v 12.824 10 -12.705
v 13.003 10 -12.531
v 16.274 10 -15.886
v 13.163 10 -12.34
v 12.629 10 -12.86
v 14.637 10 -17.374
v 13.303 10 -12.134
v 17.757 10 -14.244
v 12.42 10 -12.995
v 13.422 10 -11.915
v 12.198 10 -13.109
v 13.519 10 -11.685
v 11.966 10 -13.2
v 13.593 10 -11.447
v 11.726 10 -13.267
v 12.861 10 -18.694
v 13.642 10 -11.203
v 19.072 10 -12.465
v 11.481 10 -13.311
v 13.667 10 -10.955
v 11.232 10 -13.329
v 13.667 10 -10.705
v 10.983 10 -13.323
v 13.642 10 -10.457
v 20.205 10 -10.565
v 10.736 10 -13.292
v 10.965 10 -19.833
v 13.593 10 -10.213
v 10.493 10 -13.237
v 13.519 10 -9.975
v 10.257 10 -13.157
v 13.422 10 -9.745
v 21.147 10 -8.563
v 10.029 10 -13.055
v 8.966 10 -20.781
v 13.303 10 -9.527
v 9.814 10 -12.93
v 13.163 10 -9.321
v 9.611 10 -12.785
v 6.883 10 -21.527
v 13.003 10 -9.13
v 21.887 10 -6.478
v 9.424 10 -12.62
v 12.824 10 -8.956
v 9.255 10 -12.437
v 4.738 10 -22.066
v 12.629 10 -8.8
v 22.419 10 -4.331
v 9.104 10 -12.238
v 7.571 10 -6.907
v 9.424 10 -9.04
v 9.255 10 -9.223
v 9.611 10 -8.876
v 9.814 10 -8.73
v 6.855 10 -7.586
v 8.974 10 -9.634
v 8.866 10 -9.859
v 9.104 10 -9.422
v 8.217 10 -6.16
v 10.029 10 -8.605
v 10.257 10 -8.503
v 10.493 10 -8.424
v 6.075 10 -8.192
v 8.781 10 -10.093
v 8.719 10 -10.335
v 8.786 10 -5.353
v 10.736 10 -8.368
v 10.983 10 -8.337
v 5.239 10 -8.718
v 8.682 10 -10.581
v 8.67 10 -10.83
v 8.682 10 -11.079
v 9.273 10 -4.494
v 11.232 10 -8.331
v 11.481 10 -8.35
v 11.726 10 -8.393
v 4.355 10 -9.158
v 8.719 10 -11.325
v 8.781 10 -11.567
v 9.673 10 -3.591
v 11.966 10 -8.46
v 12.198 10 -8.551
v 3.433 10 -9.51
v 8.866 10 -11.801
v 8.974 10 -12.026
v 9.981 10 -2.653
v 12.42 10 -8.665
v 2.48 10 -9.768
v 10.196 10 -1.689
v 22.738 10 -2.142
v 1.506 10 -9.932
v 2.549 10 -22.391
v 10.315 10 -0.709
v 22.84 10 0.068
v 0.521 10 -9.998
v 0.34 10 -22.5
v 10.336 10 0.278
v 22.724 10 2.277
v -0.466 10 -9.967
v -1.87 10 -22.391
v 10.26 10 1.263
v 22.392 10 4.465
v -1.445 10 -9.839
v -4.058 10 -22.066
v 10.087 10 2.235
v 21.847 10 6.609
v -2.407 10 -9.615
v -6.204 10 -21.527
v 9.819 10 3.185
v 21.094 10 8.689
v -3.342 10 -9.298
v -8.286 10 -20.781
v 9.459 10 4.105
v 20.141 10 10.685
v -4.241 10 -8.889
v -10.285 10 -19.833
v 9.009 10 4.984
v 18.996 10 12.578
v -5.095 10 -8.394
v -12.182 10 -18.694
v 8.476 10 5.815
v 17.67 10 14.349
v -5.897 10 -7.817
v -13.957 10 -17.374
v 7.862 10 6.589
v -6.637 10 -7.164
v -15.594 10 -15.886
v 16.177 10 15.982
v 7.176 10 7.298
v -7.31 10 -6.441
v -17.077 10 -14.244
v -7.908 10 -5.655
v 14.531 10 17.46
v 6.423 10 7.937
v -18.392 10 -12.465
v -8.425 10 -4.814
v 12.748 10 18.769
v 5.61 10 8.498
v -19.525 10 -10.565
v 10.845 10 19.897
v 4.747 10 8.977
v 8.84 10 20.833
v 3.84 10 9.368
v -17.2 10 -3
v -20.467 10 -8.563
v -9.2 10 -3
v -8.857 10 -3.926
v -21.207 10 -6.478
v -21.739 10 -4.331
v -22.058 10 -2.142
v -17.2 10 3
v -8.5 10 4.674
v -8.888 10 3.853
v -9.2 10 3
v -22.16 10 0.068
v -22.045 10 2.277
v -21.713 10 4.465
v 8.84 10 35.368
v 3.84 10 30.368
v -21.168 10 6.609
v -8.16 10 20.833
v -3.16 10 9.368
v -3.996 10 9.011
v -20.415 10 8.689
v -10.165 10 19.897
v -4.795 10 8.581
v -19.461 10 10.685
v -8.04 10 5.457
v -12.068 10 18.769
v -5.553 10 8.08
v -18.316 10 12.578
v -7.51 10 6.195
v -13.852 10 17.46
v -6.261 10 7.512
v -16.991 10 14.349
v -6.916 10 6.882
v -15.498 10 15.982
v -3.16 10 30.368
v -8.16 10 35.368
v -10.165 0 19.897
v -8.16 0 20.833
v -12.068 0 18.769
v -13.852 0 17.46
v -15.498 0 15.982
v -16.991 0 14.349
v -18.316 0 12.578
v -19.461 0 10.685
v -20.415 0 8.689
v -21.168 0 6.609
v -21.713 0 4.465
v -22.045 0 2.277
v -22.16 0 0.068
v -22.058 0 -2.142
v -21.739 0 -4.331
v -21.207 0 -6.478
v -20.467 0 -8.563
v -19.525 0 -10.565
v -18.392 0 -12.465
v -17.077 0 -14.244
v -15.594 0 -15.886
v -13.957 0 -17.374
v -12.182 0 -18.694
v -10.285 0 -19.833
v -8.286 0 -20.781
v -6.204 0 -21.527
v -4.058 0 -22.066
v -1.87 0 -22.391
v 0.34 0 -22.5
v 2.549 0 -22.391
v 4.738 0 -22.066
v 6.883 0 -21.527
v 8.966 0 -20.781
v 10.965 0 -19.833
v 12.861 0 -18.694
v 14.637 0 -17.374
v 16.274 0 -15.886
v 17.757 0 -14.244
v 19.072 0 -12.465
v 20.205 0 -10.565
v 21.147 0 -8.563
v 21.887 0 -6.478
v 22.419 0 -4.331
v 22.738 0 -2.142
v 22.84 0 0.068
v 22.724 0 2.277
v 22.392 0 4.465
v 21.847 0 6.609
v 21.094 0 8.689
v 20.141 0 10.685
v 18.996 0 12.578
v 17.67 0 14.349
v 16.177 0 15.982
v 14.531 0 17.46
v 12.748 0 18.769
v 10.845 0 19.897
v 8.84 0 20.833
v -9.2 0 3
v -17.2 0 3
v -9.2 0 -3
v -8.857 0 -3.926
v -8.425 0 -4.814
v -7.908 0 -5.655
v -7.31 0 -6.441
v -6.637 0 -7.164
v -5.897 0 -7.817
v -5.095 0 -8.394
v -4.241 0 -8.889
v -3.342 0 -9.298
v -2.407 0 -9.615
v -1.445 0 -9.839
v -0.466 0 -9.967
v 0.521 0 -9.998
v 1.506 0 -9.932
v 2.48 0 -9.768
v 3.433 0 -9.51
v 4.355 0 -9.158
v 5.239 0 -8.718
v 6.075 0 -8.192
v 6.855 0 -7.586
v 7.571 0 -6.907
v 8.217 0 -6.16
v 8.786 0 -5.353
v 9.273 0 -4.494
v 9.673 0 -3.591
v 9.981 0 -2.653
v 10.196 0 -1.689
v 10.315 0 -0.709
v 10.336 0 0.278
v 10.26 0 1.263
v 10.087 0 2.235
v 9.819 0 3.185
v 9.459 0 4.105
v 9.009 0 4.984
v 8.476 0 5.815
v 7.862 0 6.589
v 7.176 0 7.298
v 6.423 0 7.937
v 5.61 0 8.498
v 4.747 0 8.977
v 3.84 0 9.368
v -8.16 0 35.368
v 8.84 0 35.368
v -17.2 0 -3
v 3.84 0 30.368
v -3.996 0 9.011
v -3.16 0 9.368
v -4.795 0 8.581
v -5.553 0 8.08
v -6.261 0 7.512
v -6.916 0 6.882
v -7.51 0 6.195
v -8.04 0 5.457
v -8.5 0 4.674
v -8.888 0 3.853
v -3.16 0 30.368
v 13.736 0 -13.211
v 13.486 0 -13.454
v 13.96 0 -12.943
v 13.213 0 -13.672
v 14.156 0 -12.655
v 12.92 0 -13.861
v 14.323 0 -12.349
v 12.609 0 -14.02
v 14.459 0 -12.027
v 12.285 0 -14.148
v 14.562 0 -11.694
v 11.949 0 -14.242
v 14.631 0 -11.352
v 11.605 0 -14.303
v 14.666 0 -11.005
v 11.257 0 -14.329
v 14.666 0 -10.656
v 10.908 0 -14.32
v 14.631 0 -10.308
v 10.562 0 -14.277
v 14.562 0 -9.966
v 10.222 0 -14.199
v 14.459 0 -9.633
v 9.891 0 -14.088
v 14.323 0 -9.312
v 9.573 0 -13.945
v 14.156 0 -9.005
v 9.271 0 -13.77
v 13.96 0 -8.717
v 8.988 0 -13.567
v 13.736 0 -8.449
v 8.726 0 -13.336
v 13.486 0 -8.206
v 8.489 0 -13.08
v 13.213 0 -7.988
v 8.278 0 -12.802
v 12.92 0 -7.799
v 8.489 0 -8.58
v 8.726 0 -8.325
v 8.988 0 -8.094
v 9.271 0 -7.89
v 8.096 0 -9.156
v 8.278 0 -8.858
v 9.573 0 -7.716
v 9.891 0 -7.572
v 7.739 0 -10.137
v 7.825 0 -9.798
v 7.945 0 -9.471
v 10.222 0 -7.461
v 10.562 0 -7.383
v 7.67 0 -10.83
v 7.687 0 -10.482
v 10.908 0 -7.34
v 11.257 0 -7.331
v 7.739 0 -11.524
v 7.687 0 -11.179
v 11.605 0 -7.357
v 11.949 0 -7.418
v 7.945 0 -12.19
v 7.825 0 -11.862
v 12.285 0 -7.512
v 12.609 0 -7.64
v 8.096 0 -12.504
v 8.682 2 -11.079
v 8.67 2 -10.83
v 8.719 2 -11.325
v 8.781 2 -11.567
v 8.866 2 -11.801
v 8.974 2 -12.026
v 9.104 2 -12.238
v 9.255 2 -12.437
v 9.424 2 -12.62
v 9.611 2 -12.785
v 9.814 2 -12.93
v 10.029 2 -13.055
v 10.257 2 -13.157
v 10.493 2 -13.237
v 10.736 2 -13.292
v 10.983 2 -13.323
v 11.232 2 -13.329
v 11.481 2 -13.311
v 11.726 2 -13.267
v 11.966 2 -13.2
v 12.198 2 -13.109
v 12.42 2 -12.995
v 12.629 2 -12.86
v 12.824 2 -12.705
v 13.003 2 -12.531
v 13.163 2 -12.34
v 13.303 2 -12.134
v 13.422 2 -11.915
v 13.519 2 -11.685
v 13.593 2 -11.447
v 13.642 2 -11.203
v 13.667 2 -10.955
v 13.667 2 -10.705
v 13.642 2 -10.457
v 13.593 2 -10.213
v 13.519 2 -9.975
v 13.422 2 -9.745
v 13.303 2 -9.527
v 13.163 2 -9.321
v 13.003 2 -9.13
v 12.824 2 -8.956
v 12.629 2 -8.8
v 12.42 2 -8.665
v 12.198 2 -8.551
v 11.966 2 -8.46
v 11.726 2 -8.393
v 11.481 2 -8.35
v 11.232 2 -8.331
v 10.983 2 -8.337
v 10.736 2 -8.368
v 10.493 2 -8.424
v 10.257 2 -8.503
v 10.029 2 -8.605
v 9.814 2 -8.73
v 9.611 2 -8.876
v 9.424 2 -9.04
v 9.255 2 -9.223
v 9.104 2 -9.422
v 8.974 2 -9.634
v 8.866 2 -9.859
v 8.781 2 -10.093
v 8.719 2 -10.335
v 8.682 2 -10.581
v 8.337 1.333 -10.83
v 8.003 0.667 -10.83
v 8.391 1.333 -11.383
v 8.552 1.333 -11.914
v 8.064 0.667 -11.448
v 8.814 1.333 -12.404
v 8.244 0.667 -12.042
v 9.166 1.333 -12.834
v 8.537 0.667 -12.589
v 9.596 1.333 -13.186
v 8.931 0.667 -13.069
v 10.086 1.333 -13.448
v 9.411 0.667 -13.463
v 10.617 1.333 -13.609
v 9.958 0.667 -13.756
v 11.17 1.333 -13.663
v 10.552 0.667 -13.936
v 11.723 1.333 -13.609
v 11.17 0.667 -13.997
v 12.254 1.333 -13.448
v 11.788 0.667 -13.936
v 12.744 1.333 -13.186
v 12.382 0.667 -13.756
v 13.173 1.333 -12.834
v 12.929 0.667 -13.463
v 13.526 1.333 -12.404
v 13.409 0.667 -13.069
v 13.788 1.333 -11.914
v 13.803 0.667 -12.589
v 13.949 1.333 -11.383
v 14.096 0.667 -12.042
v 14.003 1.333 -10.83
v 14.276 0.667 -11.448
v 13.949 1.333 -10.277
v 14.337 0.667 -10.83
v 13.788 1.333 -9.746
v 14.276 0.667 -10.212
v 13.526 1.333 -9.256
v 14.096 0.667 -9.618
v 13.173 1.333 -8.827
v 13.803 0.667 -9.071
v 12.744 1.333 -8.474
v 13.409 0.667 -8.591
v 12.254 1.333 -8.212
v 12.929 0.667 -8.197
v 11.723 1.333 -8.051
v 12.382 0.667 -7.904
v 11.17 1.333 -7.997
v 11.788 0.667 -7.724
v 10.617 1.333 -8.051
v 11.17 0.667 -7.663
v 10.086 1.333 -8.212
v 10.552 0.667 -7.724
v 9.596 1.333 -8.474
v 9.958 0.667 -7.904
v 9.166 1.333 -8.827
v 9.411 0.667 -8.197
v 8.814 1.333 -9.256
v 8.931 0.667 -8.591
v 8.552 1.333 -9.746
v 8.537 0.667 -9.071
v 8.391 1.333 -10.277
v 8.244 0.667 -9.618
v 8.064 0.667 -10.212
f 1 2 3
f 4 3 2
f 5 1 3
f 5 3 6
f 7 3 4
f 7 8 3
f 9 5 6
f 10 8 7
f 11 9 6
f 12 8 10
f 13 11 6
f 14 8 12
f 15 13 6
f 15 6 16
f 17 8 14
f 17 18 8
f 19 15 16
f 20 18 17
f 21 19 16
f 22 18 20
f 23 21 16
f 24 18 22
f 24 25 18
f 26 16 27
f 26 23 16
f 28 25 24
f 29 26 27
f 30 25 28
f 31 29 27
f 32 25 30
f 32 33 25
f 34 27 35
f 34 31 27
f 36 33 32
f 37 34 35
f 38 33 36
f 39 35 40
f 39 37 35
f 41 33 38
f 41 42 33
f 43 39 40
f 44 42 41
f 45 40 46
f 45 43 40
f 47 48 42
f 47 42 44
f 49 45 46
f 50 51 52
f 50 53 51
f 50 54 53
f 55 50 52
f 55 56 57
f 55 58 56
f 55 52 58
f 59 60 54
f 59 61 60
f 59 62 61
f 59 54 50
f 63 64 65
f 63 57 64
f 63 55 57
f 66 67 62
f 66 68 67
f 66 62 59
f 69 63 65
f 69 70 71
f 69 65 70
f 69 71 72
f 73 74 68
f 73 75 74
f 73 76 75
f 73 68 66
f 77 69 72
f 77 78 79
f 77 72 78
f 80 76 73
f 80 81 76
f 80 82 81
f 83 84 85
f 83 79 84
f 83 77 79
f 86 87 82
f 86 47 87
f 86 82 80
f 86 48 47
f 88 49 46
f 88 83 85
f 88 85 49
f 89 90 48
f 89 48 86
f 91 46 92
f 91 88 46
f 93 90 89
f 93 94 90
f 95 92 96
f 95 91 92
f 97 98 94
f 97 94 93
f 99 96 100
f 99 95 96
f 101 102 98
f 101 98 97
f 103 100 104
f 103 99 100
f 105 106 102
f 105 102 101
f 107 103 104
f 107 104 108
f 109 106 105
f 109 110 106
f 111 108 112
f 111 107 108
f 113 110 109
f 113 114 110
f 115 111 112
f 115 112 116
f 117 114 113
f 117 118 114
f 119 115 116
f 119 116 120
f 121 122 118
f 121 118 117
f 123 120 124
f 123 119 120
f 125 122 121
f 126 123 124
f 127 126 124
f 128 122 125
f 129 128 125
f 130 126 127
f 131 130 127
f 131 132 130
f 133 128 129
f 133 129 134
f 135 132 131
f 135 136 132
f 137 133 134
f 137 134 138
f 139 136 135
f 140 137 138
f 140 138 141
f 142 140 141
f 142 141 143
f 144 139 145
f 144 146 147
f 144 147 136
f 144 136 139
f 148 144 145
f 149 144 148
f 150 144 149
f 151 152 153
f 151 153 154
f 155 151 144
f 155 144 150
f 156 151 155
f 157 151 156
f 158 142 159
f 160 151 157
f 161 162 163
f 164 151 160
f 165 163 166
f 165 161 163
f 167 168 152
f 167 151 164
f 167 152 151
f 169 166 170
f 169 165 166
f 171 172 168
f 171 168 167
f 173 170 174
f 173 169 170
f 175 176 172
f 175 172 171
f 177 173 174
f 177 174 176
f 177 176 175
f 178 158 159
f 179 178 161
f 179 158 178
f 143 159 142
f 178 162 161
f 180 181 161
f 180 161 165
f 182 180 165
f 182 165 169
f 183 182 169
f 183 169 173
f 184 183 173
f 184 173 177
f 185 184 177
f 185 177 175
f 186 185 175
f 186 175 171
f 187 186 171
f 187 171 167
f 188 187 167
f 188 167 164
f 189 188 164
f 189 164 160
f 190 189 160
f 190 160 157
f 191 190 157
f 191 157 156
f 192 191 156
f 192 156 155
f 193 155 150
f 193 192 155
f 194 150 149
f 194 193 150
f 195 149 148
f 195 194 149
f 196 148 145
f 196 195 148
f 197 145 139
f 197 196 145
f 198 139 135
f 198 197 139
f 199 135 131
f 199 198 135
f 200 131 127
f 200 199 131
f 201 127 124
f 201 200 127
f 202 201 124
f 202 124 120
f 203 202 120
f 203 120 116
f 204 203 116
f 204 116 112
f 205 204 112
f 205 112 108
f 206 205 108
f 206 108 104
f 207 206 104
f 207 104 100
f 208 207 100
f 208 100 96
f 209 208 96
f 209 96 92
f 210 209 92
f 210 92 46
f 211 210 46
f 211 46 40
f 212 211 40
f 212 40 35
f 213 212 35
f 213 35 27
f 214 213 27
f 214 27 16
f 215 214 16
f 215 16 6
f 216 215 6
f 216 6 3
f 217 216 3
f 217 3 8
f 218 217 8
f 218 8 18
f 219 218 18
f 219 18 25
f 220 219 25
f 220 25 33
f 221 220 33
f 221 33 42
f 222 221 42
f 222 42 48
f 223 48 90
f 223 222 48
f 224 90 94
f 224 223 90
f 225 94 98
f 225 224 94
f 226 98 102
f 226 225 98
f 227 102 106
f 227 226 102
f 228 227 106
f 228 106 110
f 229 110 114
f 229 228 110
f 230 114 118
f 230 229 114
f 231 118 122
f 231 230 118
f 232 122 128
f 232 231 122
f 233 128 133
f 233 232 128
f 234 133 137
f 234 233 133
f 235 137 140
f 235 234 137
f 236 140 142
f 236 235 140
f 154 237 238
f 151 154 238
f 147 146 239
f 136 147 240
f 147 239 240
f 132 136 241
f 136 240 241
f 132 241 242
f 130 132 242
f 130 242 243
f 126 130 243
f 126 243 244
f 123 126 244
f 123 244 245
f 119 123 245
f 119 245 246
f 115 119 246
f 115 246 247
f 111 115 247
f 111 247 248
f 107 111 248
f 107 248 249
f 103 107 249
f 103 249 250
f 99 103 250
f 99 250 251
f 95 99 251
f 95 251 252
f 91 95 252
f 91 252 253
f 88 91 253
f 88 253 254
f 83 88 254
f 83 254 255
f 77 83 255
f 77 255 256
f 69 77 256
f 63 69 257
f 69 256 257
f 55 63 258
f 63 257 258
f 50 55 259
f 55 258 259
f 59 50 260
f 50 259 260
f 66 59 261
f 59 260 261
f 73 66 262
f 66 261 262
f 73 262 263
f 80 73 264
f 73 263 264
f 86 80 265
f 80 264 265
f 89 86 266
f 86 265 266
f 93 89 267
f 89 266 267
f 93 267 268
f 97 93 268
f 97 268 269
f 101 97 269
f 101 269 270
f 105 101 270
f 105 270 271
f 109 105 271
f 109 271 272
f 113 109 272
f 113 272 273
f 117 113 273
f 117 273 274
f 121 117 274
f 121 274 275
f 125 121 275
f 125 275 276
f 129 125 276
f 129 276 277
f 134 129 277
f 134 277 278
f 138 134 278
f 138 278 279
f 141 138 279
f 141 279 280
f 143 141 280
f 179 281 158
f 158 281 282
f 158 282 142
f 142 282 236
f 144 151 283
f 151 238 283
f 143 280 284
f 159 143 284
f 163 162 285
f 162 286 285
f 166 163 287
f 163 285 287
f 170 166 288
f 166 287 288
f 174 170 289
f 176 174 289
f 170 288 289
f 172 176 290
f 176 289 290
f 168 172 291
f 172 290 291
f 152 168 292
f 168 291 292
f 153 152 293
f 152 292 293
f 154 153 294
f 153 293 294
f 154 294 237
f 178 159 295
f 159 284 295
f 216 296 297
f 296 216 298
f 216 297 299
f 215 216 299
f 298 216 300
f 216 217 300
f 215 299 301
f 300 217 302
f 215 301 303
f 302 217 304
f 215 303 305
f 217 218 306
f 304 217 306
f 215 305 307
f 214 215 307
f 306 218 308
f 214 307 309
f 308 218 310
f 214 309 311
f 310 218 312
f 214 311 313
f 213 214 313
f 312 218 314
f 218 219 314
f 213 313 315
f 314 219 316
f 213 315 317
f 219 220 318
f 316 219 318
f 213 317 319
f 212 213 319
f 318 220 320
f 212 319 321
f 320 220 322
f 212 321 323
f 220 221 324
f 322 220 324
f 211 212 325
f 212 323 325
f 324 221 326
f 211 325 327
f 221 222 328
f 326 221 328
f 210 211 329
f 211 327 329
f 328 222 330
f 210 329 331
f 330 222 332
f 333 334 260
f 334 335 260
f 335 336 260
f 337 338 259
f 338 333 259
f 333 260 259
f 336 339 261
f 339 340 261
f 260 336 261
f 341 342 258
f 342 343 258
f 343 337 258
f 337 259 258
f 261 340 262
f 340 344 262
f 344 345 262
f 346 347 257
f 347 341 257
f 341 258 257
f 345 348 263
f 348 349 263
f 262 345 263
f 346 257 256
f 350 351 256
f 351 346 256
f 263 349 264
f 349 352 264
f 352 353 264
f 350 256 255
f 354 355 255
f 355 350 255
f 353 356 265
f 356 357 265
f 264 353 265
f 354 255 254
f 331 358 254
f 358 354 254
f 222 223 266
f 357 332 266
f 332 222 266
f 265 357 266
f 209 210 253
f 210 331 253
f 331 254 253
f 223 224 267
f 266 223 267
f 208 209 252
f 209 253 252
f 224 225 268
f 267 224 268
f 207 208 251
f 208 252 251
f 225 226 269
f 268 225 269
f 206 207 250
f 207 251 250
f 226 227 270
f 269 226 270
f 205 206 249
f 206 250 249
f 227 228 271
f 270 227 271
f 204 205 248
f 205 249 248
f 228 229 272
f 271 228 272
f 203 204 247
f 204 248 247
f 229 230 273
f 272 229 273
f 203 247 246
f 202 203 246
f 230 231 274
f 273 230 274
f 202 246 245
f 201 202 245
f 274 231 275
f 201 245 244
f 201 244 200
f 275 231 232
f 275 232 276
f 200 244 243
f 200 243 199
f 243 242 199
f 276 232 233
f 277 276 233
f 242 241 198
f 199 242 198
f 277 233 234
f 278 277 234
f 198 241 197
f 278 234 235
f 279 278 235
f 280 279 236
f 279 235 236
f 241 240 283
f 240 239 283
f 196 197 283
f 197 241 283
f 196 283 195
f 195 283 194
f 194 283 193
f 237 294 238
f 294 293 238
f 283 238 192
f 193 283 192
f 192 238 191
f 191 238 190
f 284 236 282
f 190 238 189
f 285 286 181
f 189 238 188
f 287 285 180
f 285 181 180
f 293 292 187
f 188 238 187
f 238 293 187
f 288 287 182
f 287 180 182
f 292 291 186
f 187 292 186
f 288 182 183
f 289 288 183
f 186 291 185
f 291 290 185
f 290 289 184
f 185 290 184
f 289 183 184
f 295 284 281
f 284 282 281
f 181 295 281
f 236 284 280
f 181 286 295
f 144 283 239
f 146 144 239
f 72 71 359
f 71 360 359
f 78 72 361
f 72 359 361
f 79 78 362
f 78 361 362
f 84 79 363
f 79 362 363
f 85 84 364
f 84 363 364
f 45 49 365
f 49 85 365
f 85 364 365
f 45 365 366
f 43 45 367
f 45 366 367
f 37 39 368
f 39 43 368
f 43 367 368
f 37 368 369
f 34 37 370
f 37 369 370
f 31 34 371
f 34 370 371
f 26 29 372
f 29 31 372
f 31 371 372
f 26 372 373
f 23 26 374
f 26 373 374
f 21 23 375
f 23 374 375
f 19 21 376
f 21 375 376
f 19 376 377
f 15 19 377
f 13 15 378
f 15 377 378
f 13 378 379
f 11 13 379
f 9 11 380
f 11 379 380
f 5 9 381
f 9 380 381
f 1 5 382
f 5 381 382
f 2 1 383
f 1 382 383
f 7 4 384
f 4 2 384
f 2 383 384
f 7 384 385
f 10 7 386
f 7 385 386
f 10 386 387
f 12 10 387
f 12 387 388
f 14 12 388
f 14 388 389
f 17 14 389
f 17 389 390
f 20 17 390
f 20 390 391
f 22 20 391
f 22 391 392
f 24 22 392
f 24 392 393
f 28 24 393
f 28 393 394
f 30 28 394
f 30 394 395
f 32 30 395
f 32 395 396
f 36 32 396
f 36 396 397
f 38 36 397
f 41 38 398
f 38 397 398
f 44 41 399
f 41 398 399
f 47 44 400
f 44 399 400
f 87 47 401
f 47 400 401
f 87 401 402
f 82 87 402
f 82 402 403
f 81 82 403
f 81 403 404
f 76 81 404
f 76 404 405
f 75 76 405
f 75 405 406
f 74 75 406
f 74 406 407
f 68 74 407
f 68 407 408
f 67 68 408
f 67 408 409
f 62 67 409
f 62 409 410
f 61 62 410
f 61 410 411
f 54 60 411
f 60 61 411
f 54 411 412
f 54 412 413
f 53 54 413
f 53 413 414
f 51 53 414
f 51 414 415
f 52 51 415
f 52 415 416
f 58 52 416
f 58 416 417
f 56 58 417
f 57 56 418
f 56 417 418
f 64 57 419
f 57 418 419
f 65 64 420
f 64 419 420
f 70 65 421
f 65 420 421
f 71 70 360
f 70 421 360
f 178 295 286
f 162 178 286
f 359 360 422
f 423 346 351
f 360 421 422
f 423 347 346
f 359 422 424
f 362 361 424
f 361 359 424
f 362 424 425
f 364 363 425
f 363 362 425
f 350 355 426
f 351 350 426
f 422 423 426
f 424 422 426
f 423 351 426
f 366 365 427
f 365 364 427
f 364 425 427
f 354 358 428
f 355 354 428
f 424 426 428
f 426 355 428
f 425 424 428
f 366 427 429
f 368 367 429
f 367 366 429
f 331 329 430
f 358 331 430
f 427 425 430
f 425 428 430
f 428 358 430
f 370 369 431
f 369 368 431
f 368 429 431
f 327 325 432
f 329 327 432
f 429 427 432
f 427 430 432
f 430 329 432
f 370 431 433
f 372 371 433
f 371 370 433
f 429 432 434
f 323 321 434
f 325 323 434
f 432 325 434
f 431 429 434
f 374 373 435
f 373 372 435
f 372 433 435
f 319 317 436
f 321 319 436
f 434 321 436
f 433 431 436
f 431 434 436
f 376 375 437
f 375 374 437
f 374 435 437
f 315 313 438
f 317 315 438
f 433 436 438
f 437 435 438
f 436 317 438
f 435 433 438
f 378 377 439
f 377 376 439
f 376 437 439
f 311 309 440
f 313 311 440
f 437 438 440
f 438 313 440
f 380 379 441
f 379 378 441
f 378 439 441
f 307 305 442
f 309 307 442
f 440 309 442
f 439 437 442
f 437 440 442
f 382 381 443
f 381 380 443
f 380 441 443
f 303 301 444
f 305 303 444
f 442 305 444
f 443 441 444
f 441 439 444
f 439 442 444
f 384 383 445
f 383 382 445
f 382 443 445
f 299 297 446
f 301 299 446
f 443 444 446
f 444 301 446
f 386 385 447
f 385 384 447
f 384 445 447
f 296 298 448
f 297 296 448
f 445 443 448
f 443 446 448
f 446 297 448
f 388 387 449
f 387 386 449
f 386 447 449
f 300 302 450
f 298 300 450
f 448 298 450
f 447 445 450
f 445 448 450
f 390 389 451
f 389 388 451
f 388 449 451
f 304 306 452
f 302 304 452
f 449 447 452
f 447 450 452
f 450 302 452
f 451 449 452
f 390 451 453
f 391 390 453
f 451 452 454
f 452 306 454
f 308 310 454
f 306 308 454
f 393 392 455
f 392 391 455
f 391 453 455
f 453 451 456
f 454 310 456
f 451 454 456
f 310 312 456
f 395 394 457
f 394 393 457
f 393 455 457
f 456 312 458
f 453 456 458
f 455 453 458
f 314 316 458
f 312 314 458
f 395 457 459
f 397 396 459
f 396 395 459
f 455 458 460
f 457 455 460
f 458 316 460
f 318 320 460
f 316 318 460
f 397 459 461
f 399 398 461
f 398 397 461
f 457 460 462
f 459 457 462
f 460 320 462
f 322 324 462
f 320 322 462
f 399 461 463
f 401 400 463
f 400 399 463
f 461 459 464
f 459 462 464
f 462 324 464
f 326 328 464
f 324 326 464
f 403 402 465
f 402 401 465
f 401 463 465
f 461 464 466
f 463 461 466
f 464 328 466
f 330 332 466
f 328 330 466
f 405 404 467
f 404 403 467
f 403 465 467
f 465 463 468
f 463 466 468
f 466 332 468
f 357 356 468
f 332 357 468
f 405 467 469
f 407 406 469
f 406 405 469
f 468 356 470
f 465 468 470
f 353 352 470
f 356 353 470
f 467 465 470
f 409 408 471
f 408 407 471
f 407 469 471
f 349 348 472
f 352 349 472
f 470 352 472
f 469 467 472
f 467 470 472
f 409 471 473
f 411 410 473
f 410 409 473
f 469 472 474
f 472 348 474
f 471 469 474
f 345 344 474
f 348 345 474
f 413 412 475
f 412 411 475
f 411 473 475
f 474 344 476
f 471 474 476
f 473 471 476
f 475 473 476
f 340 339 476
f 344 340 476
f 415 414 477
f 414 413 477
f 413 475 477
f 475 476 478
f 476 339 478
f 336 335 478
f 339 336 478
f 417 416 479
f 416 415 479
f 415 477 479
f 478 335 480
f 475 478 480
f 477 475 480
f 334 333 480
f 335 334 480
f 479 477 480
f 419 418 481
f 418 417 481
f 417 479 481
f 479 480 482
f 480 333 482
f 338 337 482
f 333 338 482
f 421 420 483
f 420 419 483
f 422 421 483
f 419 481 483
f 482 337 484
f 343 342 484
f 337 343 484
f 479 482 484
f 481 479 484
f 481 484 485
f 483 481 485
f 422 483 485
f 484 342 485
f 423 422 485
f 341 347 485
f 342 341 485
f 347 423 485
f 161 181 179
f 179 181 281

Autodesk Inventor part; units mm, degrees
ref_plane "YZ Plane" through (0, 0, 0) normal (1, 0, 0) x (0, 1, 0)
ref_plane "XZ Plane" through (0, 0, 0) normal (0, 1, 0) x (-1, 0, 0)
ref_plane "XY Plane" through (0, 0, 0) normal (0, 0, 1) x (1, 0, 0)
sketch "Esquisse1" plane through (0, 0, 0) normal (0, 1, 0) x (-1, 0, 0)
  circle A0 centre (-0.3398, 0) radius 22.5
  circle A1 centre (-0.3398, 0) radius 10
  line L0 (3.1602, 9.3675) -> (-3.8398, 9.3675)
  line L1 (-3.8398, 9.3675) -> (-3.8398, 30.3675)
  line L2 (-3.8398, 30.3675) -> (3.1602, 30.3675)
  line L3 (3.1602, 30.3675) -> (3.1602, 9.3675)
  line L4 (-8.8398, 35.3675) -> (-8.8398, 4.3675)
  line L5 (-8.8398, 4.3675) -> (8.1602, 4.3675)
  line L6 (8.1602, 4.3675) -> (8.1602, 35.3675)
  line L7 (8.1602, 35.3675) -> (-8.8398, 35.3675)
  line L8 (17.1996, -3) -> (9.1996, -3)
  line L9 (9.1996, -3) -> (9.1996, 3)
  line L10 (9.1996, 3) -> (17.1996, 3)
  line L11 (17.1996, 3) -> (17.1996, -3)
  line L12 (15.5701, 15.9099) -> (-16.2497, -15.9099) construction
  line L13 (-0.3398, -15.9099) -> (-16.2497, -15.9099) construction
  line L14 (-16.2497, -15.9099) -> (-16.2497, 0) construction
  line L15 (-0.3398, -15.9099) -> (-0.3398, 0) construction
  line L16 (-0.3398, 0) -> (-16.2497, 0) construction
  circle A2 centre (-11.1699, -10.8301) radius 2.5
  line L17 (-11.1699, -10.8301) -> (-16.2497, -15.9099) construction
  line L18 (-7.4109, -7.0711) -> (-11.1699, -10.8301) construction
  point P0 (-8.8398, 20.8327)
  point P1 (8.1602, 20.8327)
  dimension "d2" = 45
  dimension "d3" = 20
  dimension "d4" = 7
  dimension "d5" = 21
  dimension "d6" = 5
  dimension "d7" = 6
  dimension "d8" = 8
  dimension "d9" = 5
extrude "Extrusion1" add sketch "Esquisse1" along normal blind 10 contours A0 L4 A1 L8 L11 L10 L6 | L6 A1 L3 A0 | A0 L3 L2 L1 L4 L7 L6 | A0 L1 A1 L4
chamfer "Chanfrein1" distance 2 distance2 1 1 edges at (13.6699, 0, -10.8301) measured on face at (8.7023, 6.6667, -11.2311)
properties part number "Pièce_maintient_pièce"
